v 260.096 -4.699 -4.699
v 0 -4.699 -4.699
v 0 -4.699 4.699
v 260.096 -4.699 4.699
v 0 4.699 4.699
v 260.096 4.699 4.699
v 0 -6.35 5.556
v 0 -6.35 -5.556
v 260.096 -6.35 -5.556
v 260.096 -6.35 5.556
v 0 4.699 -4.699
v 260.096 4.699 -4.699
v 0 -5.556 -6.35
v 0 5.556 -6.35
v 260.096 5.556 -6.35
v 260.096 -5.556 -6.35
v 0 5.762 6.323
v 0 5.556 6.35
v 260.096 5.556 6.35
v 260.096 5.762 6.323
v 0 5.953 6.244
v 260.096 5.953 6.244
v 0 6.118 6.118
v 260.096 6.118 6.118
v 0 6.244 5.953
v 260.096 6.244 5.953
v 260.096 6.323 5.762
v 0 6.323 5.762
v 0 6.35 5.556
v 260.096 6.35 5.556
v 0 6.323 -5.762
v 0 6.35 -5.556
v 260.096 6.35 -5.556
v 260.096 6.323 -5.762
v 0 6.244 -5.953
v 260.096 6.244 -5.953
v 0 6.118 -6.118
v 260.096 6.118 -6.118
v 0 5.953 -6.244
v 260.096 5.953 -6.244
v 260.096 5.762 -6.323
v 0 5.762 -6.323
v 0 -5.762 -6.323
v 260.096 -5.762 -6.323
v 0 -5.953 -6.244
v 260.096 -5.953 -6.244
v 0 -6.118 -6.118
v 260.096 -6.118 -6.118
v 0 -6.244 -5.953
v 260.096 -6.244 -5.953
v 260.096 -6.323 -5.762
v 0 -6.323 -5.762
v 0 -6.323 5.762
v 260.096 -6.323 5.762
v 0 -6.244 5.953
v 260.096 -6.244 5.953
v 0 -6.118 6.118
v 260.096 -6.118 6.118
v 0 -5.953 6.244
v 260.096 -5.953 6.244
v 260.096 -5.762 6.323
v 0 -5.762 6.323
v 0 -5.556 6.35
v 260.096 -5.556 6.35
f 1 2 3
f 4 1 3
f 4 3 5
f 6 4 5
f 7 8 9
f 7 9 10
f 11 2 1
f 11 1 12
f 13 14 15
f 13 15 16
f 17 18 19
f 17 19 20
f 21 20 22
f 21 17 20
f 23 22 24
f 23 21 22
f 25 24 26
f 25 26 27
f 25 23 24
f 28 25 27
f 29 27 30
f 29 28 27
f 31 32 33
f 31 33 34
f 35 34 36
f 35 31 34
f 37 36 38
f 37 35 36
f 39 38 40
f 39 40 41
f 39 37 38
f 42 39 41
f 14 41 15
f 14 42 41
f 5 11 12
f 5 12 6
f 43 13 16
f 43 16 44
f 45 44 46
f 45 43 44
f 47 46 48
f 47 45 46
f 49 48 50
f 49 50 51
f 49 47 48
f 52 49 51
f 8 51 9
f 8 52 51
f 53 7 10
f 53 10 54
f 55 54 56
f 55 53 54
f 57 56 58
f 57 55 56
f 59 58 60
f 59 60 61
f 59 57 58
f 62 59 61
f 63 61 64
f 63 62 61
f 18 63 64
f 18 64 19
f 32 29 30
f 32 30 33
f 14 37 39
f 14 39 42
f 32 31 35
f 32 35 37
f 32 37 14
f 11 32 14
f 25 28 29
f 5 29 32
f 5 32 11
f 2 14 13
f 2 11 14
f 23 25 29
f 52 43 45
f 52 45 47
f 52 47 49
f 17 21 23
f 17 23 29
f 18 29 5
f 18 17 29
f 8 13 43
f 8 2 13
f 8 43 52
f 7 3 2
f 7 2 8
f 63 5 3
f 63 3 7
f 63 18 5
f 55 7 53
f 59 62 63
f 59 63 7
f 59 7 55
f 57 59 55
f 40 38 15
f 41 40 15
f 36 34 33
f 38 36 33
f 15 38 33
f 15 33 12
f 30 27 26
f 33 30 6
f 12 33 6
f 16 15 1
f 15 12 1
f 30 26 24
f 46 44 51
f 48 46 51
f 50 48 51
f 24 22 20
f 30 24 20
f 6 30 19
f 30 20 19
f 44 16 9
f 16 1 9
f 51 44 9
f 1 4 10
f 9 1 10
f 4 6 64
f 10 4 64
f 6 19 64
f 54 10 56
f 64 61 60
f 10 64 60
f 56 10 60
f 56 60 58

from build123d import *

# Parameters (mm, degrees)
SKETCH11_W               = 9.398
SKETCH11_H               = 9.398
STRUCTURAL_MEMBER1_DEPTH = 260.096


with BuildPart() as part:
    # Sketch11 → Structural Member1 (new body)
    with BuildSketch(Plane.YZ):
        with BuildLine():
            Line((-5.55625, 6.35), (5.55625, 6.35))
            ThreePointArc((5.55625, 6.35), (6.117516008, 6.117516008), (6.35, 5.55625))
            Line((6.35, 5.55625), (6.35, -5.55625))
            ThreePointArc((6.35, -5.55625), (6.117516008, -6.117516008), (5.55625, -6.35))
            Line((5.55625, -6.35), (-5.55625, -6.35))
            ThreePointArc((-5.55625, -6.35), (-6.117516008, -6.117516008), (-6.35, -5.55625))
            Line((-6.35, -5.55625), (-6.35, 5.55625))
            ThreePointArc((-6.35, 5.55625), (-6.117516008, 6.117516008), (-5.55625, 6.35))
        make_face()
        Rectangle(SKETCH11_W, SKETCH11_H, mode=Mode.SUBTRACT)
    extrude(amount=STRUCTURAL_MEMBER1_DEPTH)


solid = part.part
